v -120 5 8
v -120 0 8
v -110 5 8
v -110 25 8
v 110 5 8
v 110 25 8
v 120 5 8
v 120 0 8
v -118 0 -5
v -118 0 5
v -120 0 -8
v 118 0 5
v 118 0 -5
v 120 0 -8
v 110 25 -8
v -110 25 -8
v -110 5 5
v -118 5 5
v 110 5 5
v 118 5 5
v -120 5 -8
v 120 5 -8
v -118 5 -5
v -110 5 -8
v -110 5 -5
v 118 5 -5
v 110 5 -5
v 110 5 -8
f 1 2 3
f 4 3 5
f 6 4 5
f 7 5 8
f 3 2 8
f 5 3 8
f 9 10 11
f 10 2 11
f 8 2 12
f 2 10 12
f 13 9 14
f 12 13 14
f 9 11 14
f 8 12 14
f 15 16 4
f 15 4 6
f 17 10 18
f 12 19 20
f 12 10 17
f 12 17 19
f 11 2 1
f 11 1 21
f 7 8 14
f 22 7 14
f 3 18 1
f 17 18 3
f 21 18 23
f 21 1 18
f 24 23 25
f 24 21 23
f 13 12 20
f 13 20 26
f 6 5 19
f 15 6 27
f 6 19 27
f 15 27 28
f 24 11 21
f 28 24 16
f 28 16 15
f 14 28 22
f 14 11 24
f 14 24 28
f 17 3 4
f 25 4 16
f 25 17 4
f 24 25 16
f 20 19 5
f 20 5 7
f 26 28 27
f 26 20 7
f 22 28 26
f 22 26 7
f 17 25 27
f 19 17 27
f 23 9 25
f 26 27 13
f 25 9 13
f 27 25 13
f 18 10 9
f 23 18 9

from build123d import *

# Parameters (mm, degrees)
SKETCH1_W           = 240
SKETCH1_H           = 16
BOSS_EXTRUDE1_DEPTH = 5
SKETCH2_W           = 236
SKETCH2_H           = 10
CUT_EXTRUDE1_DEPTH  = 5
SKETCH4_W           = 220
SKETCH4_H           = 16
BOSS_EXTRUDE3_DEPTH = 20


with BuildPart() as part:
    # Sketch1 → Boss-Extrude1 (new body)
    with BuildSketch(Plane(origin=(0, 0, 0), x_dir=(1, 0, 0), z_dir=(0, 1, 0))):
        Rectangle(SKETCH1_W, SKETCH1_H)
    extrude(amount=BOSS_EXTRUDE1_DEPTH)

    # Sketch2 → Cut-Extrude1 (cut)
    with BuildSketch(Plane(origin=(0, 0, 0), x_dir=(1, 0, 0), z_dir=(0, 1, 0))):
        Rectangle(SKETCH2_W, SKETCH2_H)
    extrude(amount=CUT_EXTRUDE1_DEPTH, mode=Mode.SUBTRACT)

    # Sketch4 → Boss-Extrude3 (add)
    with BuildSketch(Plane(origin=(0, 5, 0), x_dir=(1, 0, 0), z_dir=(0, 1, 0))):
        Rectangle(SKETCH4_W, SKETCH4_H)
    extrude(amount=BOSS_EXTRUDE3_DEPTH)


solid = part.part
